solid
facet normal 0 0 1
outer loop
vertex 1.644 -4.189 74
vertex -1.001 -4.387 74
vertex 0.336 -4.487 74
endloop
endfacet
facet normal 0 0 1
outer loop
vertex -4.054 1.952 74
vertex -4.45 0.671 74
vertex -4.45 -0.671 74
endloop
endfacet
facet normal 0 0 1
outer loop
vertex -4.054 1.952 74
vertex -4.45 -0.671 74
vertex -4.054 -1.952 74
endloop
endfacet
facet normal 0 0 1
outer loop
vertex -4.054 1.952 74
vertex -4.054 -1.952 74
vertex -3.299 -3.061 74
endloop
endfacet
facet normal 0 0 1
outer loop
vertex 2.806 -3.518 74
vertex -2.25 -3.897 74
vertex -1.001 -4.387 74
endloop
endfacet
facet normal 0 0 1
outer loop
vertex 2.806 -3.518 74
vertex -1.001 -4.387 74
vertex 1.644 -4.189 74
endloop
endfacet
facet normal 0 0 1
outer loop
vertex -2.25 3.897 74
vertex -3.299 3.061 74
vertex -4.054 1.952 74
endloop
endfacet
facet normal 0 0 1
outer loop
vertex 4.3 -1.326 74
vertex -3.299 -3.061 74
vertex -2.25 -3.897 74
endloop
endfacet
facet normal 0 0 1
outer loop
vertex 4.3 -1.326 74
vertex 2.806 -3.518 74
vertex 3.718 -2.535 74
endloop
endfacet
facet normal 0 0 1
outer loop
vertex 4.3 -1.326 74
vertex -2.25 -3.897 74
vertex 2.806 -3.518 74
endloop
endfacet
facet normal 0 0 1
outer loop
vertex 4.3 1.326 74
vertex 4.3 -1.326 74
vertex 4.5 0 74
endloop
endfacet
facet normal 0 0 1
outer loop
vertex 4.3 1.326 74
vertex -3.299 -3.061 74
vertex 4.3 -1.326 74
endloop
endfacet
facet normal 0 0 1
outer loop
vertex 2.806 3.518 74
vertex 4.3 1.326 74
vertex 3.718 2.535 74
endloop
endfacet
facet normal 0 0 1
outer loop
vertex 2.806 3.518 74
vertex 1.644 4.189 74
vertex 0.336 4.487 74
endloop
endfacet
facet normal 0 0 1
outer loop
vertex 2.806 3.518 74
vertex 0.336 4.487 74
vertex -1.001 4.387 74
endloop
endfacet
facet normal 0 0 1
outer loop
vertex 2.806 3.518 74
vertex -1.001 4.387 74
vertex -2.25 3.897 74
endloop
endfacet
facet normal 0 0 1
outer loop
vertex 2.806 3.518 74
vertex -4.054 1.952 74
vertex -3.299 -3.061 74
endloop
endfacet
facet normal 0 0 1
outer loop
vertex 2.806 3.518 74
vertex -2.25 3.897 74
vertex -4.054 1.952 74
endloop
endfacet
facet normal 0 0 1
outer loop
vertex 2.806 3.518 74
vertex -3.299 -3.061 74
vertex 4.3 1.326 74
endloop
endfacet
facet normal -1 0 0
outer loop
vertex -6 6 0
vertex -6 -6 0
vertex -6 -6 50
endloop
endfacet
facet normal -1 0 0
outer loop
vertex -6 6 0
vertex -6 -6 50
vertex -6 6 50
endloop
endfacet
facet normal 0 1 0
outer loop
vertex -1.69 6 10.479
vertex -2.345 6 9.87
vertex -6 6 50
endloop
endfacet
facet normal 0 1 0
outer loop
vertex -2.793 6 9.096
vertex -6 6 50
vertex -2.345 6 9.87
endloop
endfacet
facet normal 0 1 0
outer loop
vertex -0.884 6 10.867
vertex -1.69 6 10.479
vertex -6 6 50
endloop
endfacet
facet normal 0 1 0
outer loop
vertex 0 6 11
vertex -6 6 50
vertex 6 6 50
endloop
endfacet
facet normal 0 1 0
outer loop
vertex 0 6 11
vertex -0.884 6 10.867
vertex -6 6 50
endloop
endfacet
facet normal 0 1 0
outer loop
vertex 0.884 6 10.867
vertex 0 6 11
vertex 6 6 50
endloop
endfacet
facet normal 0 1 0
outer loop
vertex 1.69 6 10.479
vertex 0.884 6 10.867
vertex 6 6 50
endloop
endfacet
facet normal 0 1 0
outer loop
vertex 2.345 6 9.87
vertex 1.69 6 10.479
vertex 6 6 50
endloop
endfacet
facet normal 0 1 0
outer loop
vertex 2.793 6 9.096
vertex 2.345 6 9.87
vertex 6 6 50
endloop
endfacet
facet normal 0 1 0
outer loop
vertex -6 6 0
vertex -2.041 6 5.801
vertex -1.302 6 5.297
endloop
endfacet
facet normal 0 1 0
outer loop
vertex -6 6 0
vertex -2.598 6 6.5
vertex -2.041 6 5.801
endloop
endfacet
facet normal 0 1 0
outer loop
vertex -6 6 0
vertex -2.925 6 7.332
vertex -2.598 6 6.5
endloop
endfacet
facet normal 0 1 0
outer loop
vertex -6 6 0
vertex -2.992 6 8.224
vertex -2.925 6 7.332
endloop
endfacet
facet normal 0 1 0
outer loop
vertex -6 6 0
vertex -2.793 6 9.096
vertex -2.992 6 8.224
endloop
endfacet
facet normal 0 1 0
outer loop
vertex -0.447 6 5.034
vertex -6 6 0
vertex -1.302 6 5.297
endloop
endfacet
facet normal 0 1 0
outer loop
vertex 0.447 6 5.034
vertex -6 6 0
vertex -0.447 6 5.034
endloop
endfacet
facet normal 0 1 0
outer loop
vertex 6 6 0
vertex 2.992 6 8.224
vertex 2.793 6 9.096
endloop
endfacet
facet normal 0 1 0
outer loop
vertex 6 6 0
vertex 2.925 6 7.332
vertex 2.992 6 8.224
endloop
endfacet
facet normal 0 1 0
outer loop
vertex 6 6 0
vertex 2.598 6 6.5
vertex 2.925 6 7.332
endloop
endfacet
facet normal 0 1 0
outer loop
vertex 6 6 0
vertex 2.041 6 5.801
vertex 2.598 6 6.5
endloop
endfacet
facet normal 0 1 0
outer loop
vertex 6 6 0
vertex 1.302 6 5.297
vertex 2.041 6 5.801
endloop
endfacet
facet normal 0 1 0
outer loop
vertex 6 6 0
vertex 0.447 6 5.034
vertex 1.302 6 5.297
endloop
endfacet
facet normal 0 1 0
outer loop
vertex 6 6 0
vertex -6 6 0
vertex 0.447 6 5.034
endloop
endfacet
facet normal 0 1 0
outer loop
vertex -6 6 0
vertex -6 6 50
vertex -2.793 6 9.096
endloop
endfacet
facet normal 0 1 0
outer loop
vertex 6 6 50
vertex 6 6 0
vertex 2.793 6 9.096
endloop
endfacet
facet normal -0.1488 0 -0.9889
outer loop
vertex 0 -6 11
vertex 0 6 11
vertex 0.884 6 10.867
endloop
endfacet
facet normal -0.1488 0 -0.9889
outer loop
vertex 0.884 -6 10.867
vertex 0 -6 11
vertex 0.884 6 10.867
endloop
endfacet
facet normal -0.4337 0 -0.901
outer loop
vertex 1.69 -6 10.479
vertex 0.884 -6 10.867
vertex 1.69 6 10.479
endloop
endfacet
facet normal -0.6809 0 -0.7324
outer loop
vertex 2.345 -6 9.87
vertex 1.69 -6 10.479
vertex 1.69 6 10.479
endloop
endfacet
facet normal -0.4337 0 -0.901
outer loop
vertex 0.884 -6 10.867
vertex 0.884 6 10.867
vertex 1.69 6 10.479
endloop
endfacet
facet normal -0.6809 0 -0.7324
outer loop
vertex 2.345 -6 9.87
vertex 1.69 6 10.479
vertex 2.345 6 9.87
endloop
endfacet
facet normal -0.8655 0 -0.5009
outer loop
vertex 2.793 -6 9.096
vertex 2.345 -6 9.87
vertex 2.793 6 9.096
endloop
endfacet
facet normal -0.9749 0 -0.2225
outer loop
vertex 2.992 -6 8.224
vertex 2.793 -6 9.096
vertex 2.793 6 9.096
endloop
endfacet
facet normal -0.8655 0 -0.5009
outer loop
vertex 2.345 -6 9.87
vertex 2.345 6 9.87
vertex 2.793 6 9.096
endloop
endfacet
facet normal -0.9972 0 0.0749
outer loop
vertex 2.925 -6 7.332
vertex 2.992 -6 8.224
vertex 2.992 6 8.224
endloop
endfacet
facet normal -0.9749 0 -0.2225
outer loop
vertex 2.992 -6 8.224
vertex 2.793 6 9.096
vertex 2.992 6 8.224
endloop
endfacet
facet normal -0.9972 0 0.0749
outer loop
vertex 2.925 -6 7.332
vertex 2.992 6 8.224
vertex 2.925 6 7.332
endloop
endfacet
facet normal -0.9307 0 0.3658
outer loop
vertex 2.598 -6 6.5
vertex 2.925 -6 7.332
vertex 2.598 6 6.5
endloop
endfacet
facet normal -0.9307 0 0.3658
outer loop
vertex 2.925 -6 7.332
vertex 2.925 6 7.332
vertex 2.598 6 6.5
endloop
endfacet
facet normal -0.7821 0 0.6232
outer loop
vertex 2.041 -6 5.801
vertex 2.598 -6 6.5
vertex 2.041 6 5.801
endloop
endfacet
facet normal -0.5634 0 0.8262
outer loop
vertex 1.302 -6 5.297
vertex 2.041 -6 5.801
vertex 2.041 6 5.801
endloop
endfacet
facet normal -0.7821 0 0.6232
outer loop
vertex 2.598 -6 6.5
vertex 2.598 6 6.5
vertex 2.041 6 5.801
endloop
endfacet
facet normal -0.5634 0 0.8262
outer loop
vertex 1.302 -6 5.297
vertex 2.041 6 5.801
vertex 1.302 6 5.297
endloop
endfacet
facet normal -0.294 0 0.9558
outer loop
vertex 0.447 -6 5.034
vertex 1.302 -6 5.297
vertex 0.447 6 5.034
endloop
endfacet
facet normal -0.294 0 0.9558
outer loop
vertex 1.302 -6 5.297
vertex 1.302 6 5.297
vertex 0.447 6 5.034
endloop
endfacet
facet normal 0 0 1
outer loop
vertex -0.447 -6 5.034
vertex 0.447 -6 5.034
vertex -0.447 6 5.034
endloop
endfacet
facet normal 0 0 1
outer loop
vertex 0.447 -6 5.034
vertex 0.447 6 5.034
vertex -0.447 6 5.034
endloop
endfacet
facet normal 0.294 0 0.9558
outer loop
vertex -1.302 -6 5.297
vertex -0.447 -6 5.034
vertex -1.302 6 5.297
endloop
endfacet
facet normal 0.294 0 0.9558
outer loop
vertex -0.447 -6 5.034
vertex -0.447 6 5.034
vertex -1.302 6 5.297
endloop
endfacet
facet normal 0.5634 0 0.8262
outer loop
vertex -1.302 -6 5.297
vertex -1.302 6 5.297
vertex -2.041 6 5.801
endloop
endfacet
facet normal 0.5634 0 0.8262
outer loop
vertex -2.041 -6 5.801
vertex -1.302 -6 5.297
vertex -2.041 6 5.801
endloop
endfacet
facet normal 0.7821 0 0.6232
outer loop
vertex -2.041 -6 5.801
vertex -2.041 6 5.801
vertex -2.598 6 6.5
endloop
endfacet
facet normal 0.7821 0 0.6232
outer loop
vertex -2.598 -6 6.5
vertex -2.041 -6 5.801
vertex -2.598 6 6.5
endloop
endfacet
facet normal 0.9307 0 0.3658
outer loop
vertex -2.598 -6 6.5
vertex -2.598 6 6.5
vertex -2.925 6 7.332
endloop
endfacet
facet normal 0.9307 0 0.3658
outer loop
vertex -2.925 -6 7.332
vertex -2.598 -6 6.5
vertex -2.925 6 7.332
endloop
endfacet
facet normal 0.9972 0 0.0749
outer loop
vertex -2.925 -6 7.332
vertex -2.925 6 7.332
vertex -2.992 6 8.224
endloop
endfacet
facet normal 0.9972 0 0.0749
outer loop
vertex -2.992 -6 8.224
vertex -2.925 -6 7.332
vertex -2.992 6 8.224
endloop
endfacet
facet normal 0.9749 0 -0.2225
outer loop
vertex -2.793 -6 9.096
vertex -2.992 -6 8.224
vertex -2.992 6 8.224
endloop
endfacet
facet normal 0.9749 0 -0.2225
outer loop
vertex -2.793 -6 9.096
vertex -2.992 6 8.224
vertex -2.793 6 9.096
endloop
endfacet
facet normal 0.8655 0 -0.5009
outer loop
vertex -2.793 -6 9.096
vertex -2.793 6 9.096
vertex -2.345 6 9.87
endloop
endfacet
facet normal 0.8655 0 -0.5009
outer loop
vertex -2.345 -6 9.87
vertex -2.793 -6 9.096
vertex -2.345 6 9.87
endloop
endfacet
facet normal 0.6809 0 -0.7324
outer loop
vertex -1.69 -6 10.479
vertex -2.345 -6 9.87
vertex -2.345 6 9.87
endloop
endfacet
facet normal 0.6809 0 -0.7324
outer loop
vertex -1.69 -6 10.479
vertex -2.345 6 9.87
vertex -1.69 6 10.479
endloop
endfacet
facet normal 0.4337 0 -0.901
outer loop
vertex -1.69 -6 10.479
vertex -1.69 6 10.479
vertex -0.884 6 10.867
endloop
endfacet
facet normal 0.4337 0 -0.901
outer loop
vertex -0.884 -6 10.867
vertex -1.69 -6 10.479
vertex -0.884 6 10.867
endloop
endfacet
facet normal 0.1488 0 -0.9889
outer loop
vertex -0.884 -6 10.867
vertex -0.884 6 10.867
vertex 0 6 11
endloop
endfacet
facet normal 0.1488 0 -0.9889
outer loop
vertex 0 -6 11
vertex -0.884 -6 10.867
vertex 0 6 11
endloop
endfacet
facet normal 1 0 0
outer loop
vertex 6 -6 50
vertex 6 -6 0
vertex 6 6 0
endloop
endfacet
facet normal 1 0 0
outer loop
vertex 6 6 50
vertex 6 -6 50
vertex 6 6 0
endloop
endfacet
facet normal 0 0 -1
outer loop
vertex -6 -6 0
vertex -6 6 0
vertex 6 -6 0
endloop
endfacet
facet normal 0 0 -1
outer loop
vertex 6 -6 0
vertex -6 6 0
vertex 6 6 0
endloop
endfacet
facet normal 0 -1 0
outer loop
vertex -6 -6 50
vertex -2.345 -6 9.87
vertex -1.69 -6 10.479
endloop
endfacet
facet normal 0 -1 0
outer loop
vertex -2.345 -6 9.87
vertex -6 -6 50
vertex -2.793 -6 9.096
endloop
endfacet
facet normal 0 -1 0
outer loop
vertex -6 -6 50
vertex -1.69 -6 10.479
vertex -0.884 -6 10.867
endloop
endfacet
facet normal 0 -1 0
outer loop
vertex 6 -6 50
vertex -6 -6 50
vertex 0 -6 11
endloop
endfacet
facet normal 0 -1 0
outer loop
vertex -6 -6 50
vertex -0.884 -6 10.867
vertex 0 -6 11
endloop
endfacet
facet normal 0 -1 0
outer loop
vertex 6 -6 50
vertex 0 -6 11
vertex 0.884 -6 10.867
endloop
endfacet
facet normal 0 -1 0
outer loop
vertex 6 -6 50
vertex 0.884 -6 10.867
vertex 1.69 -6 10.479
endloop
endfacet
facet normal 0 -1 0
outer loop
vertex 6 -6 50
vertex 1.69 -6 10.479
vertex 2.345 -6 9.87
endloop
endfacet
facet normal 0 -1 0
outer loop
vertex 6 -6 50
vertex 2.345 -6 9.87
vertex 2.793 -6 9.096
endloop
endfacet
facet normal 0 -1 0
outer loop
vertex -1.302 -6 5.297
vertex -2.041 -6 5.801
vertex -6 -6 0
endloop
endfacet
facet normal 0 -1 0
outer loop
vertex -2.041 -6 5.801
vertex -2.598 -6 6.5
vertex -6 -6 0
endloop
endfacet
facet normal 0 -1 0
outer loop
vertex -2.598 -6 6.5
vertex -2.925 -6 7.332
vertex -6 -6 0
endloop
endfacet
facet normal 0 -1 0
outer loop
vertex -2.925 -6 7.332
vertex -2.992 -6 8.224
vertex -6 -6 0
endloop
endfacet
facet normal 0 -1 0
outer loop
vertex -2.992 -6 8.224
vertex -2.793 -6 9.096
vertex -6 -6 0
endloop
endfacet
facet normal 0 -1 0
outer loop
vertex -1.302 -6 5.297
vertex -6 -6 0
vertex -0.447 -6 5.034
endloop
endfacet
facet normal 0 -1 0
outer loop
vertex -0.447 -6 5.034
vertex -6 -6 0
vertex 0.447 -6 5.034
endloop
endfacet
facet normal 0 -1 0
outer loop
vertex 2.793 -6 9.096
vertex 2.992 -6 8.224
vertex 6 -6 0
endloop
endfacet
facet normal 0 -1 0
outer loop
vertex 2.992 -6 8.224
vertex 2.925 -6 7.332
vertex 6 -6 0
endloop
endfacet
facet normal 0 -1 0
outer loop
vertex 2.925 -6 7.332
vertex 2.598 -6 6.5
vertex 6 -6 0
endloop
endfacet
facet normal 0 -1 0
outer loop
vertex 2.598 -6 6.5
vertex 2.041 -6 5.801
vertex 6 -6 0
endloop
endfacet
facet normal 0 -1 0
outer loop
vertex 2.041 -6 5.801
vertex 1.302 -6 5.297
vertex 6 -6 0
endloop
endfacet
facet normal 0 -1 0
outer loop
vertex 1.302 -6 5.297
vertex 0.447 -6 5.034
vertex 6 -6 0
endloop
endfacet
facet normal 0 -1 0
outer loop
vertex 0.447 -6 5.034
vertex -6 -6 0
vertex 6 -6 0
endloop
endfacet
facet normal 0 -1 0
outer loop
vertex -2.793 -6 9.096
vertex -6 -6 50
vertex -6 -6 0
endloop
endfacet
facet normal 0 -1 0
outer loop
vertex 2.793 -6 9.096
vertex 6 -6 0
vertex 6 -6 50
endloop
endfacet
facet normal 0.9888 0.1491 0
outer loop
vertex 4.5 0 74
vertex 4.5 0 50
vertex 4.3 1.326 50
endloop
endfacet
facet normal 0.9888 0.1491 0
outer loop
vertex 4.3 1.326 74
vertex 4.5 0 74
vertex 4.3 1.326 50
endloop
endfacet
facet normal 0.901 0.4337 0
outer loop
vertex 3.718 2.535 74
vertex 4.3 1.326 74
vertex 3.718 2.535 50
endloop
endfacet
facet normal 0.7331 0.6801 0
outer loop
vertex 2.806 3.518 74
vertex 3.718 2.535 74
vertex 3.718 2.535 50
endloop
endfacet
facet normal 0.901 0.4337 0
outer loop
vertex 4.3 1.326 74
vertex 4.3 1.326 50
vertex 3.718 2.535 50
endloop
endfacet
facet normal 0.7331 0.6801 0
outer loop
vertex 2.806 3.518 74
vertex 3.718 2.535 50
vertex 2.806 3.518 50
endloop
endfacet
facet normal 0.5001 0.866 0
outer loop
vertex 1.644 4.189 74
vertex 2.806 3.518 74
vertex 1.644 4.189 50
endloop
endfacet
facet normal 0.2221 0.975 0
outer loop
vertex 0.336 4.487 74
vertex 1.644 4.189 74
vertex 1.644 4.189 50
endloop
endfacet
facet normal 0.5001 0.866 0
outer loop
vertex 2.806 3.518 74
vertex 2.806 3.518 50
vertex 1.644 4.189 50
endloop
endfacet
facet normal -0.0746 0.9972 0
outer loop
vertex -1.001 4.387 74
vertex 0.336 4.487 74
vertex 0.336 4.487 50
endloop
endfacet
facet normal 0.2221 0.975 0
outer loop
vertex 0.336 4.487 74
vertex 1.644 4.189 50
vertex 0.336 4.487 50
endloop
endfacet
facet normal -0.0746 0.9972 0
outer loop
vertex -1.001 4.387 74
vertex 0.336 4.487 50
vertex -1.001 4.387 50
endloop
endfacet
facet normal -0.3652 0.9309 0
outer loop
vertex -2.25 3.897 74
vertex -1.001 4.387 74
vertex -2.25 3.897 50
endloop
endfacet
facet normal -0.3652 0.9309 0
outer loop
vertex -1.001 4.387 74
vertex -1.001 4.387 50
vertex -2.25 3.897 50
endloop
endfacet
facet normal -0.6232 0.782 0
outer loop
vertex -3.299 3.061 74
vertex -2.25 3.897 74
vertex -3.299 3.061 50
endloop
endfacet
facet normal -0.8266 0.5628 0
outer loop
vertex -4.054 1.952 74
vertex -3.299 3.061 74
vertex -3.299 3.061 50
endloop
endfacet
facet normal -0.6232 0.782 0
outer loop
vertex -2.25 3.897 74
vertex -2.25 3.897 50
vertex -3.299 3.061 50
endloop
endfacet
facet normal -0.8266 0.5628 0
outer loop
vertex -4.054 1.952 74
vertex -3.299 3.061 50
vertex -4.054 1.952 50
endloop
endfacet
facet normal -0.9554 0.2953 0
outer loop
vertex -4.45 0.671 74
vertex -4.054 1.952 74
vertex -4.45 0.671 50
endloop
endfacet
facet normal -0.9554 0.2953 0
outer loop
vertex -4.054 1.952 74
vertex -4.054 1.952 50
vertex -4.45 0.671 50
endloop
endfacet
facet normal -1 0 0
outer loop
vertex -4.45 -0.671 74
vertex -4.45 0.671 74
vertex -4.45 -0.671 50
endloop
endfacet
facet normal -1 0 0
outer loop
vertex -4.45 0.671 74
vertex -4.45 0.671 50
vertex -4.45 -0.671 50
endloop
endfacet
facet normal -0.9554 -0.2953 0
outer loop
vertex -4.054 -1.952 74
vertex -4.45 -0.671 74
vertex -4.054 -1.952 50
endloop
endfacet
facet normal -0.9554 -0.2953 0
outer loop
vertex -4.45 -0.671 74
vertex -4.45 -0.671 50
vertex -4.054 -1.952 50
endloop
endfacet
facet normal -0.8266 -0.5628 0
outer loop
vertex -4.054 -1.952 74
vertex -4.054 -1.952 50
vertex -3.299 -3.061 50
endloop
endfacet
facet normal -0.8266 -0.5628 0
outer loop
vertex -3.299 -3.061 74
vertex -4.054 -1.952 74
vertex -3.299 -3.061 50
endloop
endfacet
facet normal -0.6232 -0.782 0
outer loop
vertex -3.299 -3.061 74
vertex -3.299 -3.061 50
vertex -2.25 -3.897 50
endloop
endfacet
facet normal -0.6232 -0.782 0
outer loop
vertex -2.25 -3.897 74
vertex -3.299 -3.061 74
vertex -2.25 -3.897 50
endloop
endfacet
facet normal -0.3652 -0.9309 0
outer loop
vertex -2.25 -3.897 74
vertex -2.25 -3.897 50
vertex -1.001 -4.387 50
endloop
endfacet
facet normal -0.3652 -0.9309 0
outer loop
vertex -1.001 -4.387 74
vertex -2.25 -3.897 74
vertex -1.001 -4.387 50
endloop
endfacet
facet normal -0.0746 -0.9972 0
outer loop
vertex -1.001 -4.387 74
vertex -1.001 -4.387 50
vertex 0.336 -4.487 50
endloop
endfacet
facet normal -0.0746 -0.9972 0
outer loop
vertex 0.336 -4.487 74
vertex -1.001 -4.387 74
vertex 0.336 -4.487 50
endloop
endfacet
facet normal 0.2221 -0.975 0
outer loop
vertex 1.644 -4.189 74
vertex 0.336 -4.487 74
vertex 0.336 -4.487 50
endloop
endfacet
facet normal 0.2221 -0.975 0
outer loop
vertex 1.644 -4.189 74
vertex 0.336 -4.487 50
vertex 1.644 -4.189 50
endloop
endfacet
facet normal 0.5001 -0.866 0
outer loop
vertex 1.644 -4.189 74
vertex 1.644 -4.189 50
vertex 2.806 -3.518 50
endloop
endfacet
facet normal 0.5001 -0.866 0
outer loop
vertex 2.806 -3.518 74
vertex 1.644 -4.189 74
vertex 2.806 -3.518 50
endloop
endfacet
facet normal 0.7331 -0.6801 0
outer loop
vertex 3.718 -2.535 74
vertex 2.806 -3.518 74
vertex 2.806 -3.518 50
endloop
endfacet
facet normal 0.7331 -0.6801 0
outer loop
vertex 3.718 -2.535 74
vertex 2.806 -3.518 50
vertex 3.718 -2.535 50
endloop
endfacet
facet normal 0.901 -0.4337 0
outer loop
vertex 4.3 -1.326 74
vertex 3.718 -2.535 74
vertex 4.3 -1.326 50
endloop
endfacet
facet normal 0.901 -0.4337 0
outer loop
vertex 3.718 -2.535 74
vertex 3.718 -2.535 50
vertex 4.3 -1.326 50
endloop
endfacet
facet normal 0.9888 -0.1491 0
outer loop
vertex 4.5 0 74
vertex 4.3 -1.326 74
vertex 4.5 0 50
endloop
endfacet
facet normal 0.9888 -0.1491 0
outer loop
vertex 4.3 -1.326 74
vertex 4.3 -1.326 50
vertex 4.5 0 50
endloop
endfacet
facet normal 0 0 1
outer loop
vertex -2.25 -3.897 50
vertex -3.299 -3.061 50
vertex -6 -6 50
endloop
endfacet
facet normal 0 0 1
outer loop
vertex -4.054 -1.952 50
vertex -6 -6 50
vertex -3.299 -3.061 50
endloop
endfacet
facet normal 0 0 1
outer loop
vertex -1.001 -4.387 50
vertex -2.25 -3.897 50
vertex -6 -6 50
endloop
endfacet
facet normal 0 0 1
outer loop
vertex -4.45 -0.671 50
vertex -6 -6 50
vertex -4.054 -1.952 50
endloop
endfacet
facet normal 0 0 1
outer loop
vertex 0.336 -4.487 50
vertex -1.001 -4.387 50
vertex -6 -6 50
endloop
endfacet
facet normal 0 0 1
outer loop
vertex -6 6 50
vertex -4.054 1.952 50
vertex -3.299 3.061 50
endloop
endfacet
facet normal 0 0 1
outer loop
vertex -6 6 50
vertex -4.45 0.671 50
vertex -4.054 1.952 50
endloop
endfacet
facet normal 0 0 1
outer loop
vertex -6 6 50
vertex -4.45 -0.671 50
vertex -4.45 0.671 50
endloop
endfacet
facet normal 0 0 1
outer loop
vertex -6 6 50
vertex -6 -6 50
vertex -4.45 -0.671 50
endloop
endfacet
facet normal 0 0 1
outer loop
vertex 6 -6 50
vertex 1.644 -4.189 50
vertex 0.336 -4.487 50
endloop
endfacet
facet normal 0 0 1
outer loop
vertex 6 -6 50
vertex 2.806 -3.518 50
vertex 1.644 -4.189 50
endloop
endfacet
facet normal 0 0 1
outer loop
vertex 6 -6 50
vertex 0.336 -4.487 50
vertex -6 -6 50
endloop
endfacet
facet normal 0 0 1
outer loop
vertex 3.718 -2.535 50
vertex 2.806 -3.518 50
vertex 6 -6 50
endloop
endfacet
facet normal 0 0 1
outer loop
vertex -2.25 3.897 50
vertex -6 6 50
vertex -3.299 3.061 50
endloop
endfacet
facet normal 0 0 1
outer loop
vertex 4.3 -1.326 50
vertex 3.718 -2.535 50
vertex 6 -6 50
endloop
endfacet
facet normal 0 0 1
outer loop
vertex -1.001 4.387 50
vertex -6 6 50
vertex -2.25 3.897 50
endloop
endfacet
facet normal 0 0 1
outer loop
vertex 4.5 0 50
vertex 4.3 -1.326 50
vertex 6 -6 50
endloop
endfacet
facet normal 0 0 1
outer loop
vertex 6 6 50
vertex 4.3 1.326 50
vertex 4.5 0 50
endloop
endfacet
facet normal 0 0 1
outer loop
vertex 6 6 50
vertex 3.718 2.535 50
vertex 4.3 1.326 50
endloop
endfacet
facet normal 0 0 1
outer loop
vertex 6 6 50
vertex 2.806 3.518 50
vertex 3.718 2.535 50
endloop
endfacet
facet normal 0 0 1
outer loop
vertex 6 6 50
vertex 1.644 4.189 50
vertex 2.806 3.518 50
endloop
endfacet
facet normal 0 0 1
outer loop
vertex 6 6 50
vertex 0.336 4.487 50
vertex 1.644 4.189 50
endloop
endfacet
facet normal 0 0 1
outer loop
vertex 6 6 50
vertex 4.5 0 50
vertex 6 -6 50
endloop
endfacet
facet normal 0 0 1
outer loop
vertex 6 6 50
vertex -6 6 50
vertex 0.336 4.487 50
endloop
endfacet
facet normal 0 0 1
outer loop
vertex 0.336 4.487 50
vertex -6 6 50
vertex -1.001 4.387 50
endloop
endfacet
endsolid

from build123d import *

# Parameters (mm, degrees)
CROQUIS1_W              = 12
CROQUIS1_H              = 12
SALIENTE_EXTRUIR1_DEPTH = 50
CROQUIS2_R              = 4.5
SALIENTE_EXTRUIR2_DEPTH = 24
CROQUIS3_R              = 3
CORTAR_EXTRUIR1_DEPTH   = 76.206382708


with BuildPart() as part:
    # Croquis1 → Saliente-Extruir1 (new body)
    with BuildSketch(Plane.XY):
        Rectangle(CROQUIS1_W, CROQUIS1_H)
    extrude(amount=SALIENTE_EXTRUIR1_DEPTH)

    # Croquis2 → Saliente-Extruir2 (add)
    with BuildSketch(Plane.XY.offset(50)):
        Circle(CROQUIS2_R)
    extrude(amount=SALIENTE_EXTRUIR2_DEPTH)

    # Croquis3 → Cortar-Extruir1 (cut, through all)
    with BuildSketch(Plane(origin=(0, 6, 0), x_dir=(1, 0, 0), z_dir=(0, 1, 0))):
        with Locations(Location((0, -8, 0), (0, 0, 270))):
            Circle(CROQUIS3_R)
    extrude(amount=-CORTAR_EXTRUIR1_DEPTH, mode=Mode.SUBTRACT)


solid = part.part
